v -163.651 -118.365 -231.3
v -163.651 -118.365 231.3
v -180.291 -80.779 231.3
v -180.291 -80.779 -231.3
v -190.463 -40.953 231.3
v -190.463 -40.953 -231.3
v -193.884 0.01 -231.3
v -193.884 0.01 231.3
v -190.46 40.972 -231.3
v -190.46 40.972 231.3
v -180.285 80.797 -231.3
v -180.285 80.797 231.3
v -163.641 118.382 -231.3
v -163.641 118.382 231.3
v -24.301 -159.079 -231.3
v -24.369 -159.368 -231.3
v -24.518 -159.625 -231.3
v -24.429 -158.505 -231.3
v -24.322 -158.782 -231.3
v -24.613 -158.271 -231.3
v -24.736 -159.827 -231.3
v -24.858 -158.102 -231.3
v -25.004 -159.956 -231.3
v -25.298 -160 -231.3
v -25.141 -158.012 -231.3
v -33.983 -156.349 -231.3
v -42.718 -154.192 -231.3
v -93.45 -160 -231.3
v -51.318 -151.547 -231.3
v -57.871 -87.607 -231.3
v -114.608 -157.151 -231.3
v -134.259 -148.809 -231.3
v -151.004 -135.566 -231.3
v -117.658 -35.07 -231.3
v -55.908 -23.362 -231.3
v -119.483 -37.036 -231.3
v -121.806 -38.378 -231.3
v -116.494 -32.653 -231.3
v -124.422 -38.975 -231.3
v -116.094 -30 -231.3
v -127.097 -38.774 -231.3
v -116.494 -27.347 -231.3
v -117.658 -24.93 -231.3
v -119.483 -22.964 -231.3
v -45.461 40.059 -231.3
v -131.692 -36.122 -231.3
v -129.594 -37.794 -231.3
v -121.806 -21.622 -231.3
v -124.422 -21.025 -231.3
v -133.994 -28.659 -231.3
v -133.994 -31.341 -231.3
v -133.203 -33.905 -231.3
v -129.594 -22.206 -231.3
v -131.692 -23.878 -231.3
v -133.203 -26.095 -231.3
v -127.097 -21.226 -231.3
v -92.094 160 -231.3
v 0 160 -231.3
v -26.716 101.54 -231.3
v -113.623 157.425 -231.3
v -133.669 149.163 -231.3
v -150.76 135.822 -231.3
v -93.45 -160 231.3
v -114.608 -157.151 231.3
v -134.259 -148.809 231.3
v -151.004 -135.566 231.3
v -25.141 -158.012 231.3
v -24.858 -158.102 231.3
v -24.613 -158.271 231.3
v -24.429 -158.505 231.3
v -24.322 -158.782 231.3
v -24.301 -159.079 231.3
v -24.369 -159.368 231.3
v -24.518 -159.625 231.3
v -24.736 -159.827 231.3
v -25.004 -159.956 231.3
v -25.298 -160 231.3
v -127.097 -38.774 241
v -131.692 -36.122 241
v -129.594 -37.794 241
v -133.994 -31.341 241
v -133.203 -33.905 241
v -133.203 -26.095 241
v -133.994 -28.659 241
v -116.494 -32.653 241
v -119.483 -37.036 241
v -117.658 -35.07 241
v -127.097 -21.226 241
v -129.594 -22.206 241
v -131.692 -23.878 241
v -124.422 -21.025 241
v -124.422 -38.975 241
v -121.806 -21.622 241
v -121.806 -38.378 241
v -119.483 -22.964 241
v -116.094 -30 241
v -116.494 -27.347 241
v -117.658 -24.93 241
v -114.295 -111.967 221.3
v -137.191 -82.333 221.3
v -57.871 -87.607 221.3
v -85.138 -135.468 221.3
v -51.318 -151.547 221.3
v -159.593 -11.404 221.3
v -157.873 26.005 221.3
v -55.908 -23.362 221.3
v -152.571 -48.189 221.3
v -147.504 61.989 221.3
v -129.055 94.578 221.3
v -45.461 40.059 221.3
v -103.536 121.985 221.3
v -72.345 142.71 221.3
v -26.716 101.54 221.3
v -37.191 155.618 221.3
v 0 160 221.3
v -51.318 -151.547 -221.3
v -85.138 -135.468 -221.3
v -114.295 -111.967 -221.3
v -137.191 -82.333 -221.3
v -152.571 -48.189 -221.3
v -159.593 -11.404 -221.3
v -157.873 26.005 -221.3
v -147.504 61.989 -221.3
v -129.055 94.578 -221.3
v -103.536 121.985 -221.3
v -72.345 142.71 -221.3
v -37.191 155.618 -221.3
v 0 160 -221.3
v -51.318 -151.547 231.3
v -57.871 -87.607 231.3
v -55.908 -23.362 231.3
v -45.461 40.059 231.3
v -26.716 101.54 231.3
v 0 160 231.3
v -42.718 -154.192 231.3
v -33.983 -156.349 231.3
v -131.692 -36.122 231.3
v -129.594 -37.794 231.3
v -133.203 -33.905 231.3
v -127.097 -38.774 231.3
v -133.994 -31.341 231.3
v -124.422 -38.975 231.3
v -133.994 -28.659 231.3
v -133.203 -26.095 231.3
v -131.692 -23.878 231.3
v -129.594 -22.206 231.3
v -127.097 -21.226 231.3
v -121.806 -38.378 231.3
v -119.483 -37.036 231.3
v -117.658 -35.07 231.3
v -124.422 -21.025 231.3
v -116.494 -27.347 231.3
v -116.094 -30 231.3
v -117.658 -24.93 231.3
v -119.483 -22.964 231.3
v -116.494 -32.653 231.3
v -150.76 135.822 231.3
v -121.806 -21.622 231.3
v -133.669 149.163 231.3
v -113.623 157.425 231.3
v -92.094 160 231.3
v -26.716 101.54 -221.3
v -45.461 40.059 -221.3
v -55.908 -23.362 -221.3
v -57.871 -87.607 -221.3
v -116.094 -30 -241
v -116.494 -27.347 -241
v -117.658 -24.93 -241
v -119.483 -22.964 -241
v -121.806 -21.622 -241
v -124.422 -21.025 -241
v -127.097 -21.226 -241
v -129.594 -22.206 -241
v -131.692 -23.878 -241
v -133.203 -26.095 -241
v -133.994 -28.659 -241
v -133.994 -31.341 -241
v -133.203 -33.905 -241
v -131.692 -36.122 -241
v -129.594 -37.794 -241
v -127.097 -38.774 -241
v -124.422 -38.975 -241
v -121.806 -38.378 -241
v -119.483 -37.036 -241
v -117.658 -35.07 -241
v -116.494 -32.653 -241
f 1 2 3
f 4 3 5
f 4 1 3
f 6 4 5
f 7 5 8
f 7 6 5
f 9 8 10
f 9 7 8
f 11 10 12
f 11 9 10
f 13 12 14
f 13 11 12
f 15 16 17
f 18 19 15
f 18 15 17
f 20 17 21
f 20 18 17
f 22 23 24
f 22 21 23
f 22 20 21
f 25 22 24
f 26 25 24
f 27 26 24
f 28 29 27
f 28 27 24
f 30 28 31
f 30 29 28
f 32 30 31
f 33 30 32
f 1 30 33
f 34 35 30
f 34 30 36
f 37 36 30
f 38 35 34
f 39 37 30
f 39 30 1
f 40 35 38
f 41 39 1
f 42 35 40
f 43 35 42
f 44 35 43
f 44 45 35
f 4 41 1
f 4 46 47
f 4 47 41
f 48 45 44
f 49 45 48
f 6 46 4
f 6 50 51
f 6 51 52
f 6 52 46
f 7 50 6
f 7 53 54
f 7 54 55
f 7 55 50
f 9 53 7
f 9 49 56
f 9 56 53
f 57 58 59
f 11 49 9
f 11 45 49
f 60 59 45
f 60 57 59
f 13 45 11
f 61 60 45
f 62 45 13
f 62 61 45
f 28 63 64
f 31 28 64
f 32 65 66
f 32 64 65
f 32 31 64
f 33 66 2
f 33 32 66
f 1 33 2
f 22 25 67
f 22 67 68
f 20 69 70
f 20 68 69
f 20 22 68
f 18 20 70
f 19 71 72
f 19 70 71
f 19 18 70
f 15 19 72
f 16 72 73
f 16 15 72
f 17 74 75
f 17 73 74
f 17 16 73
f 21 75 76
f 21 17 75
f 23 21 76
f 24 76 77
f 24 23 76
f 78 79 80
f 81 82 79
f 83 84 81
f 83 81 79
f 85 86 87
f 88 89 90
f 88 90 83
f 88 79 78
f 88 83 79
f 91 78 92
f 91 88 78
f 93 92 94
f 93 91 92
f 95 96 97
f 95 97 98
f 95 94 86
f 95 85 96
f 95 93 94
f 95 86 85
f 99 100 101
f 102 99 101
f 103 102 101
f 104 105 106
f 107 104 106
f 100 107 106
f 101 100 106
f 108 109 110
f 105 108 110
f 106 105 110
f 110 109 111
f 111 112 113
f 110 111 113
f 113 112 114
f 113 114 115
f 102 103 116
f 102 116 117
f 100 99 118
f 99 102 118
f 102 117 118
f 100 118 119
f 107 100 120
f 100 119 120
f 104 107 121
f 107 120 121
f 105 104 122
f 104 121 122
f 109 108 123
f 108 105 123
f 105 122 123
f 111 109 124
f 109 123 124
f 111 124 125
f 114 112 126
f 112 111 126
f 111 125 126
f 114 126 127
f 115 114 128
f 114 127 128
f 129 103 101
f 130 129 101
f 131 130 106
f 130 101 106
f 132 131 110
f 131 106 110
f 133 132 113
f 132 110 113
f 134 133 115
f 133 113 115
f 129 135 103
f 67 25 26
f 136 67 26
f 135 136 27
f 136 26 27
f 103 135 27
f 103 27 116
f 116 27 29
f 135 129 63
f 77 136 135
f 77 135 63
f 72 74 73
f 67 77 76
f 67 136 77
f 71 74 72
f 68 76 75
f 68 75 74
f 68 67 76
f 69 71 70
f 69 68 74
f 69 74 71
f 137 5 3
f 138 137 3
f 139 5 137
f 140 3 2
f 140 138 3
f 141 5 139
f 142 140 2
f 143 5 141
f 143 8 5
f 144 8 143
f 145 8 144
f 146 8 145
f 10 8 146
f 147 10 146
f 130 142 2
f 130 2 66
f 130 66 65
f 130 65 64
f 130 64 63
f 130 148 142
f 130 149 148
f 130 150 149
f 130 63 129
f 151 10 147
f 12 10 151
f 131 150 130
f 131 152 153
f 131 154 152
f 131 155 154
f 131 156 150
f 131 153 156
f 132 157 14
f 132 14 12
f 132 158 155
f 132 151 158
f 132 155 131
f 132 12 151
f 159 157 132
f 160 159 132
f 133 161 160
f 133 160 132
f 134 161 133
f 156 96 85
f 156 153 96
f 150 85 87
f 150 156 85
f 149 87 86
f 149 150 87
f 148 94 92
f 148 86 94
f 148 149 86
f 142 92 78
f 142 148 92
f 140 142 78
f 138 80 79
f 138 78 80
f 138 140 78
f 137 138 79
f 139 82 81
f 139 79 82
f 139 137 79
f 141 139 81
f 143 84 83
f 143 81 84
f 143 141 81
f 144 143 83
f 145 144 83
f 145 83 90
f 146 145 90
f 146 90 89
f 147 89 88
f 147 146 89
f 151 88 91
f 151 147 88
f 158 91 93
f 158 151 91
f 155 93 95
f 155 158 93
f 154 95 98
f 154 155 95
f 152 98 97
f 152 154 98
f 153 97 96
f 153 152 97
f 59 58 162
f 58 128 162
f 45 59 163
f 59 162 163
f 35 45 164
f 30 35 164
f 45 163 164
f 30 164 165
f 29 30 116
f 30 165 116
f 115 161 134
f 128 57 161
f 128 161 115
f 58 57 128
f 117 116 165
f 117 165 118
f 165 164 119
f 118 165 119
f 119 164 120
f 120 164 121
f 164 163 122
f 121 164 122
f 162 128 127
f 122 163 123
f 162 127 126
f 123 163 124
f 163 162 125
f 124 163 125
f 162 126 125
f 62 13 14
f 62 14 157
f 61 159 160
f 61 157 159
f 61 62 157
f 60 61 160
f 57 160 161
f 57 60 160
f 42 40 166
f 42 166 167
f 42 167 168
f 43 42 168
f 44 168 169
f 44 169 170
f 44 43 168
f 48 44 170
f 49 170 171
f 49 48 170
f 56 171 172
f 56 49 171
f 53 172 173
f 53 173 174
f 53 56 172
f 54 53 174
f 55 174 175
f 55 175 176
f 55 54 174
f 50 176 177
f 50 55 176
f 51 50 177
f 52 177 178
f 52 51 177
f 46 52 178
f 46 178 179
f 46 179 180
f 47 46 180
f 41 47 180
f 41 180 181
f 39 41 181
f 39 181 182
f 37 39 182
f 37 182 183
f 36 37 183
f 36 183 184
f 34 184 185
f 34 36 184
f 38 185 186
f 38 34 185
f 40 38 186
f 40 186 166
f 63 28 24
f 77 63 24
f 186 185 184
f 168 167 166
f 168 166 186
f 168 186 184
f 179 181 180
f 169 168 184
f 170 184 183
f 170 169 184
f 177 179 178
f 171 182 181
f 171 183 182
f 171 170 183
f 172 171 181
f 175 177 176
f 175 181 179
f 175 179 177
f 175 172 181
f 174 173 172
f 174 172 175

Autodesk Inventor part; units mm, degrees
ref_plane "YZ Plane" through (0, 0, 0) normal (1, 0, 0) x (0, 1, 0)
ref_plane "XZ Plane" through (0, 0, 0) normal (0, 1, 0) x (-1, 0, 0)
ref_plane "XY Plane" through (0, 0, 0) normal (0, 0, 1) x (1, 0, 0)
sketch "Sketch1" plane through (0, 0, 0) normal (0, 0, 1) x (1, 0, 0)
  arc A0 (-163.6506, -118.3654) -> (-93.4502, -160) centre (-93.4502, -80) ccw
  line L0 (-92.0944, 160) -> (0, 160)
  line L1 (0, 160) -> (-92.0944, 160)
  arc A1 (0, 160) -> (-51.3175, -151.5471) centre (426.5438, -70.2596) ccw
  arc A2 (-51.3175, -151.5471) -> (-25.1411, -158.0124) centre (0, 0) ccw
  arc A3 (0, 160) -> (-25.1411, -158.0124) centre (0, 0) ccw
  line L2 (-93.4502, -160) -> (-25.2982, -160)
  arc A4 (-25.2982, -160) -> (-25.1411, -158.0124) centre (-25.2982, -159) ccw
  line L3 (-25.2982, -160) -> (-93.4502, -160)
  arc A5 (-163.6506, -118.3654) -> (-93.4502, -160) centre (-93.4502, -80) ccw
  arc A6 (-163.6414, 118.3822) -> (-163.6506, -118.3654) centre (52.9327, 0) ccw
  arc A7 (-92.0944, 160) -> (-163.6414, 118.3822) centre (-93.444, 80.0114) ccw
  point P0 (-51.3175, -151.5471)
  dimension "d53" = 160
  dimension "d55" = 68.152
  dimension "d56" = 80
  dimension "d60" = 92.0944
  dimension "d65" = 1
  dimension "d66" = 484.7258
  dimension "d71" = 246.8171
  dimension "d72" = 80
extrude "Extrusion1" add sketch "Sketch1" along normal mid plane 442.6 contours A6 A7 L0 A3 A2 A4 L2 A0
sketch "Sketch2" plane through (0, 0, 221.3) normal (0, 0, 1) x (1, 0, 0)
  arc A0 (-51.3175, -151.5471) -> (-25.1411, -158.0124) centre (0, 0) ccw
  line L0 (-25.2982, -160) -> (-93.4502, -160)
  arc A1 (-25.2982, -160) -> (-25.1411, -158.0124) centre (-25.2982, -159) ccw
  line L1 (-93.4502, -160) -> (-25.2982, -160)
  arc A2 (-163.6506, -118.3654) -> (-93.4502, -160) centre (-93.4502, -80) ccw
  arc A3 (-163.6506, -118.3654) -> (-93.4502, -160) centre (-93.4502, -80) ccw
  line L2 (-92.0944, 160) -> (0, 160)
  line L3 (0, 160) -> (-92.0944, 160)
  arc A4 (0, 160) -> (-51.3175, -151.5471) centre (426.5438, -70.2596) ccw
  arc A5 (0, 160) -> (-25.1411, -158.0124) centre (0, 0) ccw
  arc A6 (-163.6414, 118.3822) -> (-163.6506, -118.3654) centre (52.9327, 0) ccw
  arc A7 (-92.0944, 160) -> (-163.6414, 118.3822) centre (-93.444, 80.0114) ccw
  dimension "d73" = 160
  dimension "d74" = 68.152
  dimension "d75" = 80
  dimension "d76" = 92.0944
  dimension "d77" = 1
  dimension "d78" = 484.7258
  dimension "d79" = 246.8171
  dimension "d80" = 80
extrude "Extrusion2" add sketch "Sketch2" along normal blind 10
sketch "Sketch10" plane through (0, 0, 231.3) normal (0, 0, 1) x (1, 0, 0)
  circle A0 centre (-125.0944, -30) radius 9
  line L0 (-93.4502, -160) -> (-25.2982, -160) projected
  arc A1 (-25.2982, -160) -> (-25.1411, -158.0124) centre (-25.2982, -159) ccw projected
  point P0 (0, 0)
  dimension "d81" = 18
  dimension "d82" = 130
  dimension "d83" = 99.7962
extrude "Extrusion9" add sketch "Sketch10" along normal blind 9.7
mirror "Mirror4" about plane through (0, 0, 0) normal (0, 0, 1) of "Extrusion2", "Extrusion9"
properties part number "Shovel"
